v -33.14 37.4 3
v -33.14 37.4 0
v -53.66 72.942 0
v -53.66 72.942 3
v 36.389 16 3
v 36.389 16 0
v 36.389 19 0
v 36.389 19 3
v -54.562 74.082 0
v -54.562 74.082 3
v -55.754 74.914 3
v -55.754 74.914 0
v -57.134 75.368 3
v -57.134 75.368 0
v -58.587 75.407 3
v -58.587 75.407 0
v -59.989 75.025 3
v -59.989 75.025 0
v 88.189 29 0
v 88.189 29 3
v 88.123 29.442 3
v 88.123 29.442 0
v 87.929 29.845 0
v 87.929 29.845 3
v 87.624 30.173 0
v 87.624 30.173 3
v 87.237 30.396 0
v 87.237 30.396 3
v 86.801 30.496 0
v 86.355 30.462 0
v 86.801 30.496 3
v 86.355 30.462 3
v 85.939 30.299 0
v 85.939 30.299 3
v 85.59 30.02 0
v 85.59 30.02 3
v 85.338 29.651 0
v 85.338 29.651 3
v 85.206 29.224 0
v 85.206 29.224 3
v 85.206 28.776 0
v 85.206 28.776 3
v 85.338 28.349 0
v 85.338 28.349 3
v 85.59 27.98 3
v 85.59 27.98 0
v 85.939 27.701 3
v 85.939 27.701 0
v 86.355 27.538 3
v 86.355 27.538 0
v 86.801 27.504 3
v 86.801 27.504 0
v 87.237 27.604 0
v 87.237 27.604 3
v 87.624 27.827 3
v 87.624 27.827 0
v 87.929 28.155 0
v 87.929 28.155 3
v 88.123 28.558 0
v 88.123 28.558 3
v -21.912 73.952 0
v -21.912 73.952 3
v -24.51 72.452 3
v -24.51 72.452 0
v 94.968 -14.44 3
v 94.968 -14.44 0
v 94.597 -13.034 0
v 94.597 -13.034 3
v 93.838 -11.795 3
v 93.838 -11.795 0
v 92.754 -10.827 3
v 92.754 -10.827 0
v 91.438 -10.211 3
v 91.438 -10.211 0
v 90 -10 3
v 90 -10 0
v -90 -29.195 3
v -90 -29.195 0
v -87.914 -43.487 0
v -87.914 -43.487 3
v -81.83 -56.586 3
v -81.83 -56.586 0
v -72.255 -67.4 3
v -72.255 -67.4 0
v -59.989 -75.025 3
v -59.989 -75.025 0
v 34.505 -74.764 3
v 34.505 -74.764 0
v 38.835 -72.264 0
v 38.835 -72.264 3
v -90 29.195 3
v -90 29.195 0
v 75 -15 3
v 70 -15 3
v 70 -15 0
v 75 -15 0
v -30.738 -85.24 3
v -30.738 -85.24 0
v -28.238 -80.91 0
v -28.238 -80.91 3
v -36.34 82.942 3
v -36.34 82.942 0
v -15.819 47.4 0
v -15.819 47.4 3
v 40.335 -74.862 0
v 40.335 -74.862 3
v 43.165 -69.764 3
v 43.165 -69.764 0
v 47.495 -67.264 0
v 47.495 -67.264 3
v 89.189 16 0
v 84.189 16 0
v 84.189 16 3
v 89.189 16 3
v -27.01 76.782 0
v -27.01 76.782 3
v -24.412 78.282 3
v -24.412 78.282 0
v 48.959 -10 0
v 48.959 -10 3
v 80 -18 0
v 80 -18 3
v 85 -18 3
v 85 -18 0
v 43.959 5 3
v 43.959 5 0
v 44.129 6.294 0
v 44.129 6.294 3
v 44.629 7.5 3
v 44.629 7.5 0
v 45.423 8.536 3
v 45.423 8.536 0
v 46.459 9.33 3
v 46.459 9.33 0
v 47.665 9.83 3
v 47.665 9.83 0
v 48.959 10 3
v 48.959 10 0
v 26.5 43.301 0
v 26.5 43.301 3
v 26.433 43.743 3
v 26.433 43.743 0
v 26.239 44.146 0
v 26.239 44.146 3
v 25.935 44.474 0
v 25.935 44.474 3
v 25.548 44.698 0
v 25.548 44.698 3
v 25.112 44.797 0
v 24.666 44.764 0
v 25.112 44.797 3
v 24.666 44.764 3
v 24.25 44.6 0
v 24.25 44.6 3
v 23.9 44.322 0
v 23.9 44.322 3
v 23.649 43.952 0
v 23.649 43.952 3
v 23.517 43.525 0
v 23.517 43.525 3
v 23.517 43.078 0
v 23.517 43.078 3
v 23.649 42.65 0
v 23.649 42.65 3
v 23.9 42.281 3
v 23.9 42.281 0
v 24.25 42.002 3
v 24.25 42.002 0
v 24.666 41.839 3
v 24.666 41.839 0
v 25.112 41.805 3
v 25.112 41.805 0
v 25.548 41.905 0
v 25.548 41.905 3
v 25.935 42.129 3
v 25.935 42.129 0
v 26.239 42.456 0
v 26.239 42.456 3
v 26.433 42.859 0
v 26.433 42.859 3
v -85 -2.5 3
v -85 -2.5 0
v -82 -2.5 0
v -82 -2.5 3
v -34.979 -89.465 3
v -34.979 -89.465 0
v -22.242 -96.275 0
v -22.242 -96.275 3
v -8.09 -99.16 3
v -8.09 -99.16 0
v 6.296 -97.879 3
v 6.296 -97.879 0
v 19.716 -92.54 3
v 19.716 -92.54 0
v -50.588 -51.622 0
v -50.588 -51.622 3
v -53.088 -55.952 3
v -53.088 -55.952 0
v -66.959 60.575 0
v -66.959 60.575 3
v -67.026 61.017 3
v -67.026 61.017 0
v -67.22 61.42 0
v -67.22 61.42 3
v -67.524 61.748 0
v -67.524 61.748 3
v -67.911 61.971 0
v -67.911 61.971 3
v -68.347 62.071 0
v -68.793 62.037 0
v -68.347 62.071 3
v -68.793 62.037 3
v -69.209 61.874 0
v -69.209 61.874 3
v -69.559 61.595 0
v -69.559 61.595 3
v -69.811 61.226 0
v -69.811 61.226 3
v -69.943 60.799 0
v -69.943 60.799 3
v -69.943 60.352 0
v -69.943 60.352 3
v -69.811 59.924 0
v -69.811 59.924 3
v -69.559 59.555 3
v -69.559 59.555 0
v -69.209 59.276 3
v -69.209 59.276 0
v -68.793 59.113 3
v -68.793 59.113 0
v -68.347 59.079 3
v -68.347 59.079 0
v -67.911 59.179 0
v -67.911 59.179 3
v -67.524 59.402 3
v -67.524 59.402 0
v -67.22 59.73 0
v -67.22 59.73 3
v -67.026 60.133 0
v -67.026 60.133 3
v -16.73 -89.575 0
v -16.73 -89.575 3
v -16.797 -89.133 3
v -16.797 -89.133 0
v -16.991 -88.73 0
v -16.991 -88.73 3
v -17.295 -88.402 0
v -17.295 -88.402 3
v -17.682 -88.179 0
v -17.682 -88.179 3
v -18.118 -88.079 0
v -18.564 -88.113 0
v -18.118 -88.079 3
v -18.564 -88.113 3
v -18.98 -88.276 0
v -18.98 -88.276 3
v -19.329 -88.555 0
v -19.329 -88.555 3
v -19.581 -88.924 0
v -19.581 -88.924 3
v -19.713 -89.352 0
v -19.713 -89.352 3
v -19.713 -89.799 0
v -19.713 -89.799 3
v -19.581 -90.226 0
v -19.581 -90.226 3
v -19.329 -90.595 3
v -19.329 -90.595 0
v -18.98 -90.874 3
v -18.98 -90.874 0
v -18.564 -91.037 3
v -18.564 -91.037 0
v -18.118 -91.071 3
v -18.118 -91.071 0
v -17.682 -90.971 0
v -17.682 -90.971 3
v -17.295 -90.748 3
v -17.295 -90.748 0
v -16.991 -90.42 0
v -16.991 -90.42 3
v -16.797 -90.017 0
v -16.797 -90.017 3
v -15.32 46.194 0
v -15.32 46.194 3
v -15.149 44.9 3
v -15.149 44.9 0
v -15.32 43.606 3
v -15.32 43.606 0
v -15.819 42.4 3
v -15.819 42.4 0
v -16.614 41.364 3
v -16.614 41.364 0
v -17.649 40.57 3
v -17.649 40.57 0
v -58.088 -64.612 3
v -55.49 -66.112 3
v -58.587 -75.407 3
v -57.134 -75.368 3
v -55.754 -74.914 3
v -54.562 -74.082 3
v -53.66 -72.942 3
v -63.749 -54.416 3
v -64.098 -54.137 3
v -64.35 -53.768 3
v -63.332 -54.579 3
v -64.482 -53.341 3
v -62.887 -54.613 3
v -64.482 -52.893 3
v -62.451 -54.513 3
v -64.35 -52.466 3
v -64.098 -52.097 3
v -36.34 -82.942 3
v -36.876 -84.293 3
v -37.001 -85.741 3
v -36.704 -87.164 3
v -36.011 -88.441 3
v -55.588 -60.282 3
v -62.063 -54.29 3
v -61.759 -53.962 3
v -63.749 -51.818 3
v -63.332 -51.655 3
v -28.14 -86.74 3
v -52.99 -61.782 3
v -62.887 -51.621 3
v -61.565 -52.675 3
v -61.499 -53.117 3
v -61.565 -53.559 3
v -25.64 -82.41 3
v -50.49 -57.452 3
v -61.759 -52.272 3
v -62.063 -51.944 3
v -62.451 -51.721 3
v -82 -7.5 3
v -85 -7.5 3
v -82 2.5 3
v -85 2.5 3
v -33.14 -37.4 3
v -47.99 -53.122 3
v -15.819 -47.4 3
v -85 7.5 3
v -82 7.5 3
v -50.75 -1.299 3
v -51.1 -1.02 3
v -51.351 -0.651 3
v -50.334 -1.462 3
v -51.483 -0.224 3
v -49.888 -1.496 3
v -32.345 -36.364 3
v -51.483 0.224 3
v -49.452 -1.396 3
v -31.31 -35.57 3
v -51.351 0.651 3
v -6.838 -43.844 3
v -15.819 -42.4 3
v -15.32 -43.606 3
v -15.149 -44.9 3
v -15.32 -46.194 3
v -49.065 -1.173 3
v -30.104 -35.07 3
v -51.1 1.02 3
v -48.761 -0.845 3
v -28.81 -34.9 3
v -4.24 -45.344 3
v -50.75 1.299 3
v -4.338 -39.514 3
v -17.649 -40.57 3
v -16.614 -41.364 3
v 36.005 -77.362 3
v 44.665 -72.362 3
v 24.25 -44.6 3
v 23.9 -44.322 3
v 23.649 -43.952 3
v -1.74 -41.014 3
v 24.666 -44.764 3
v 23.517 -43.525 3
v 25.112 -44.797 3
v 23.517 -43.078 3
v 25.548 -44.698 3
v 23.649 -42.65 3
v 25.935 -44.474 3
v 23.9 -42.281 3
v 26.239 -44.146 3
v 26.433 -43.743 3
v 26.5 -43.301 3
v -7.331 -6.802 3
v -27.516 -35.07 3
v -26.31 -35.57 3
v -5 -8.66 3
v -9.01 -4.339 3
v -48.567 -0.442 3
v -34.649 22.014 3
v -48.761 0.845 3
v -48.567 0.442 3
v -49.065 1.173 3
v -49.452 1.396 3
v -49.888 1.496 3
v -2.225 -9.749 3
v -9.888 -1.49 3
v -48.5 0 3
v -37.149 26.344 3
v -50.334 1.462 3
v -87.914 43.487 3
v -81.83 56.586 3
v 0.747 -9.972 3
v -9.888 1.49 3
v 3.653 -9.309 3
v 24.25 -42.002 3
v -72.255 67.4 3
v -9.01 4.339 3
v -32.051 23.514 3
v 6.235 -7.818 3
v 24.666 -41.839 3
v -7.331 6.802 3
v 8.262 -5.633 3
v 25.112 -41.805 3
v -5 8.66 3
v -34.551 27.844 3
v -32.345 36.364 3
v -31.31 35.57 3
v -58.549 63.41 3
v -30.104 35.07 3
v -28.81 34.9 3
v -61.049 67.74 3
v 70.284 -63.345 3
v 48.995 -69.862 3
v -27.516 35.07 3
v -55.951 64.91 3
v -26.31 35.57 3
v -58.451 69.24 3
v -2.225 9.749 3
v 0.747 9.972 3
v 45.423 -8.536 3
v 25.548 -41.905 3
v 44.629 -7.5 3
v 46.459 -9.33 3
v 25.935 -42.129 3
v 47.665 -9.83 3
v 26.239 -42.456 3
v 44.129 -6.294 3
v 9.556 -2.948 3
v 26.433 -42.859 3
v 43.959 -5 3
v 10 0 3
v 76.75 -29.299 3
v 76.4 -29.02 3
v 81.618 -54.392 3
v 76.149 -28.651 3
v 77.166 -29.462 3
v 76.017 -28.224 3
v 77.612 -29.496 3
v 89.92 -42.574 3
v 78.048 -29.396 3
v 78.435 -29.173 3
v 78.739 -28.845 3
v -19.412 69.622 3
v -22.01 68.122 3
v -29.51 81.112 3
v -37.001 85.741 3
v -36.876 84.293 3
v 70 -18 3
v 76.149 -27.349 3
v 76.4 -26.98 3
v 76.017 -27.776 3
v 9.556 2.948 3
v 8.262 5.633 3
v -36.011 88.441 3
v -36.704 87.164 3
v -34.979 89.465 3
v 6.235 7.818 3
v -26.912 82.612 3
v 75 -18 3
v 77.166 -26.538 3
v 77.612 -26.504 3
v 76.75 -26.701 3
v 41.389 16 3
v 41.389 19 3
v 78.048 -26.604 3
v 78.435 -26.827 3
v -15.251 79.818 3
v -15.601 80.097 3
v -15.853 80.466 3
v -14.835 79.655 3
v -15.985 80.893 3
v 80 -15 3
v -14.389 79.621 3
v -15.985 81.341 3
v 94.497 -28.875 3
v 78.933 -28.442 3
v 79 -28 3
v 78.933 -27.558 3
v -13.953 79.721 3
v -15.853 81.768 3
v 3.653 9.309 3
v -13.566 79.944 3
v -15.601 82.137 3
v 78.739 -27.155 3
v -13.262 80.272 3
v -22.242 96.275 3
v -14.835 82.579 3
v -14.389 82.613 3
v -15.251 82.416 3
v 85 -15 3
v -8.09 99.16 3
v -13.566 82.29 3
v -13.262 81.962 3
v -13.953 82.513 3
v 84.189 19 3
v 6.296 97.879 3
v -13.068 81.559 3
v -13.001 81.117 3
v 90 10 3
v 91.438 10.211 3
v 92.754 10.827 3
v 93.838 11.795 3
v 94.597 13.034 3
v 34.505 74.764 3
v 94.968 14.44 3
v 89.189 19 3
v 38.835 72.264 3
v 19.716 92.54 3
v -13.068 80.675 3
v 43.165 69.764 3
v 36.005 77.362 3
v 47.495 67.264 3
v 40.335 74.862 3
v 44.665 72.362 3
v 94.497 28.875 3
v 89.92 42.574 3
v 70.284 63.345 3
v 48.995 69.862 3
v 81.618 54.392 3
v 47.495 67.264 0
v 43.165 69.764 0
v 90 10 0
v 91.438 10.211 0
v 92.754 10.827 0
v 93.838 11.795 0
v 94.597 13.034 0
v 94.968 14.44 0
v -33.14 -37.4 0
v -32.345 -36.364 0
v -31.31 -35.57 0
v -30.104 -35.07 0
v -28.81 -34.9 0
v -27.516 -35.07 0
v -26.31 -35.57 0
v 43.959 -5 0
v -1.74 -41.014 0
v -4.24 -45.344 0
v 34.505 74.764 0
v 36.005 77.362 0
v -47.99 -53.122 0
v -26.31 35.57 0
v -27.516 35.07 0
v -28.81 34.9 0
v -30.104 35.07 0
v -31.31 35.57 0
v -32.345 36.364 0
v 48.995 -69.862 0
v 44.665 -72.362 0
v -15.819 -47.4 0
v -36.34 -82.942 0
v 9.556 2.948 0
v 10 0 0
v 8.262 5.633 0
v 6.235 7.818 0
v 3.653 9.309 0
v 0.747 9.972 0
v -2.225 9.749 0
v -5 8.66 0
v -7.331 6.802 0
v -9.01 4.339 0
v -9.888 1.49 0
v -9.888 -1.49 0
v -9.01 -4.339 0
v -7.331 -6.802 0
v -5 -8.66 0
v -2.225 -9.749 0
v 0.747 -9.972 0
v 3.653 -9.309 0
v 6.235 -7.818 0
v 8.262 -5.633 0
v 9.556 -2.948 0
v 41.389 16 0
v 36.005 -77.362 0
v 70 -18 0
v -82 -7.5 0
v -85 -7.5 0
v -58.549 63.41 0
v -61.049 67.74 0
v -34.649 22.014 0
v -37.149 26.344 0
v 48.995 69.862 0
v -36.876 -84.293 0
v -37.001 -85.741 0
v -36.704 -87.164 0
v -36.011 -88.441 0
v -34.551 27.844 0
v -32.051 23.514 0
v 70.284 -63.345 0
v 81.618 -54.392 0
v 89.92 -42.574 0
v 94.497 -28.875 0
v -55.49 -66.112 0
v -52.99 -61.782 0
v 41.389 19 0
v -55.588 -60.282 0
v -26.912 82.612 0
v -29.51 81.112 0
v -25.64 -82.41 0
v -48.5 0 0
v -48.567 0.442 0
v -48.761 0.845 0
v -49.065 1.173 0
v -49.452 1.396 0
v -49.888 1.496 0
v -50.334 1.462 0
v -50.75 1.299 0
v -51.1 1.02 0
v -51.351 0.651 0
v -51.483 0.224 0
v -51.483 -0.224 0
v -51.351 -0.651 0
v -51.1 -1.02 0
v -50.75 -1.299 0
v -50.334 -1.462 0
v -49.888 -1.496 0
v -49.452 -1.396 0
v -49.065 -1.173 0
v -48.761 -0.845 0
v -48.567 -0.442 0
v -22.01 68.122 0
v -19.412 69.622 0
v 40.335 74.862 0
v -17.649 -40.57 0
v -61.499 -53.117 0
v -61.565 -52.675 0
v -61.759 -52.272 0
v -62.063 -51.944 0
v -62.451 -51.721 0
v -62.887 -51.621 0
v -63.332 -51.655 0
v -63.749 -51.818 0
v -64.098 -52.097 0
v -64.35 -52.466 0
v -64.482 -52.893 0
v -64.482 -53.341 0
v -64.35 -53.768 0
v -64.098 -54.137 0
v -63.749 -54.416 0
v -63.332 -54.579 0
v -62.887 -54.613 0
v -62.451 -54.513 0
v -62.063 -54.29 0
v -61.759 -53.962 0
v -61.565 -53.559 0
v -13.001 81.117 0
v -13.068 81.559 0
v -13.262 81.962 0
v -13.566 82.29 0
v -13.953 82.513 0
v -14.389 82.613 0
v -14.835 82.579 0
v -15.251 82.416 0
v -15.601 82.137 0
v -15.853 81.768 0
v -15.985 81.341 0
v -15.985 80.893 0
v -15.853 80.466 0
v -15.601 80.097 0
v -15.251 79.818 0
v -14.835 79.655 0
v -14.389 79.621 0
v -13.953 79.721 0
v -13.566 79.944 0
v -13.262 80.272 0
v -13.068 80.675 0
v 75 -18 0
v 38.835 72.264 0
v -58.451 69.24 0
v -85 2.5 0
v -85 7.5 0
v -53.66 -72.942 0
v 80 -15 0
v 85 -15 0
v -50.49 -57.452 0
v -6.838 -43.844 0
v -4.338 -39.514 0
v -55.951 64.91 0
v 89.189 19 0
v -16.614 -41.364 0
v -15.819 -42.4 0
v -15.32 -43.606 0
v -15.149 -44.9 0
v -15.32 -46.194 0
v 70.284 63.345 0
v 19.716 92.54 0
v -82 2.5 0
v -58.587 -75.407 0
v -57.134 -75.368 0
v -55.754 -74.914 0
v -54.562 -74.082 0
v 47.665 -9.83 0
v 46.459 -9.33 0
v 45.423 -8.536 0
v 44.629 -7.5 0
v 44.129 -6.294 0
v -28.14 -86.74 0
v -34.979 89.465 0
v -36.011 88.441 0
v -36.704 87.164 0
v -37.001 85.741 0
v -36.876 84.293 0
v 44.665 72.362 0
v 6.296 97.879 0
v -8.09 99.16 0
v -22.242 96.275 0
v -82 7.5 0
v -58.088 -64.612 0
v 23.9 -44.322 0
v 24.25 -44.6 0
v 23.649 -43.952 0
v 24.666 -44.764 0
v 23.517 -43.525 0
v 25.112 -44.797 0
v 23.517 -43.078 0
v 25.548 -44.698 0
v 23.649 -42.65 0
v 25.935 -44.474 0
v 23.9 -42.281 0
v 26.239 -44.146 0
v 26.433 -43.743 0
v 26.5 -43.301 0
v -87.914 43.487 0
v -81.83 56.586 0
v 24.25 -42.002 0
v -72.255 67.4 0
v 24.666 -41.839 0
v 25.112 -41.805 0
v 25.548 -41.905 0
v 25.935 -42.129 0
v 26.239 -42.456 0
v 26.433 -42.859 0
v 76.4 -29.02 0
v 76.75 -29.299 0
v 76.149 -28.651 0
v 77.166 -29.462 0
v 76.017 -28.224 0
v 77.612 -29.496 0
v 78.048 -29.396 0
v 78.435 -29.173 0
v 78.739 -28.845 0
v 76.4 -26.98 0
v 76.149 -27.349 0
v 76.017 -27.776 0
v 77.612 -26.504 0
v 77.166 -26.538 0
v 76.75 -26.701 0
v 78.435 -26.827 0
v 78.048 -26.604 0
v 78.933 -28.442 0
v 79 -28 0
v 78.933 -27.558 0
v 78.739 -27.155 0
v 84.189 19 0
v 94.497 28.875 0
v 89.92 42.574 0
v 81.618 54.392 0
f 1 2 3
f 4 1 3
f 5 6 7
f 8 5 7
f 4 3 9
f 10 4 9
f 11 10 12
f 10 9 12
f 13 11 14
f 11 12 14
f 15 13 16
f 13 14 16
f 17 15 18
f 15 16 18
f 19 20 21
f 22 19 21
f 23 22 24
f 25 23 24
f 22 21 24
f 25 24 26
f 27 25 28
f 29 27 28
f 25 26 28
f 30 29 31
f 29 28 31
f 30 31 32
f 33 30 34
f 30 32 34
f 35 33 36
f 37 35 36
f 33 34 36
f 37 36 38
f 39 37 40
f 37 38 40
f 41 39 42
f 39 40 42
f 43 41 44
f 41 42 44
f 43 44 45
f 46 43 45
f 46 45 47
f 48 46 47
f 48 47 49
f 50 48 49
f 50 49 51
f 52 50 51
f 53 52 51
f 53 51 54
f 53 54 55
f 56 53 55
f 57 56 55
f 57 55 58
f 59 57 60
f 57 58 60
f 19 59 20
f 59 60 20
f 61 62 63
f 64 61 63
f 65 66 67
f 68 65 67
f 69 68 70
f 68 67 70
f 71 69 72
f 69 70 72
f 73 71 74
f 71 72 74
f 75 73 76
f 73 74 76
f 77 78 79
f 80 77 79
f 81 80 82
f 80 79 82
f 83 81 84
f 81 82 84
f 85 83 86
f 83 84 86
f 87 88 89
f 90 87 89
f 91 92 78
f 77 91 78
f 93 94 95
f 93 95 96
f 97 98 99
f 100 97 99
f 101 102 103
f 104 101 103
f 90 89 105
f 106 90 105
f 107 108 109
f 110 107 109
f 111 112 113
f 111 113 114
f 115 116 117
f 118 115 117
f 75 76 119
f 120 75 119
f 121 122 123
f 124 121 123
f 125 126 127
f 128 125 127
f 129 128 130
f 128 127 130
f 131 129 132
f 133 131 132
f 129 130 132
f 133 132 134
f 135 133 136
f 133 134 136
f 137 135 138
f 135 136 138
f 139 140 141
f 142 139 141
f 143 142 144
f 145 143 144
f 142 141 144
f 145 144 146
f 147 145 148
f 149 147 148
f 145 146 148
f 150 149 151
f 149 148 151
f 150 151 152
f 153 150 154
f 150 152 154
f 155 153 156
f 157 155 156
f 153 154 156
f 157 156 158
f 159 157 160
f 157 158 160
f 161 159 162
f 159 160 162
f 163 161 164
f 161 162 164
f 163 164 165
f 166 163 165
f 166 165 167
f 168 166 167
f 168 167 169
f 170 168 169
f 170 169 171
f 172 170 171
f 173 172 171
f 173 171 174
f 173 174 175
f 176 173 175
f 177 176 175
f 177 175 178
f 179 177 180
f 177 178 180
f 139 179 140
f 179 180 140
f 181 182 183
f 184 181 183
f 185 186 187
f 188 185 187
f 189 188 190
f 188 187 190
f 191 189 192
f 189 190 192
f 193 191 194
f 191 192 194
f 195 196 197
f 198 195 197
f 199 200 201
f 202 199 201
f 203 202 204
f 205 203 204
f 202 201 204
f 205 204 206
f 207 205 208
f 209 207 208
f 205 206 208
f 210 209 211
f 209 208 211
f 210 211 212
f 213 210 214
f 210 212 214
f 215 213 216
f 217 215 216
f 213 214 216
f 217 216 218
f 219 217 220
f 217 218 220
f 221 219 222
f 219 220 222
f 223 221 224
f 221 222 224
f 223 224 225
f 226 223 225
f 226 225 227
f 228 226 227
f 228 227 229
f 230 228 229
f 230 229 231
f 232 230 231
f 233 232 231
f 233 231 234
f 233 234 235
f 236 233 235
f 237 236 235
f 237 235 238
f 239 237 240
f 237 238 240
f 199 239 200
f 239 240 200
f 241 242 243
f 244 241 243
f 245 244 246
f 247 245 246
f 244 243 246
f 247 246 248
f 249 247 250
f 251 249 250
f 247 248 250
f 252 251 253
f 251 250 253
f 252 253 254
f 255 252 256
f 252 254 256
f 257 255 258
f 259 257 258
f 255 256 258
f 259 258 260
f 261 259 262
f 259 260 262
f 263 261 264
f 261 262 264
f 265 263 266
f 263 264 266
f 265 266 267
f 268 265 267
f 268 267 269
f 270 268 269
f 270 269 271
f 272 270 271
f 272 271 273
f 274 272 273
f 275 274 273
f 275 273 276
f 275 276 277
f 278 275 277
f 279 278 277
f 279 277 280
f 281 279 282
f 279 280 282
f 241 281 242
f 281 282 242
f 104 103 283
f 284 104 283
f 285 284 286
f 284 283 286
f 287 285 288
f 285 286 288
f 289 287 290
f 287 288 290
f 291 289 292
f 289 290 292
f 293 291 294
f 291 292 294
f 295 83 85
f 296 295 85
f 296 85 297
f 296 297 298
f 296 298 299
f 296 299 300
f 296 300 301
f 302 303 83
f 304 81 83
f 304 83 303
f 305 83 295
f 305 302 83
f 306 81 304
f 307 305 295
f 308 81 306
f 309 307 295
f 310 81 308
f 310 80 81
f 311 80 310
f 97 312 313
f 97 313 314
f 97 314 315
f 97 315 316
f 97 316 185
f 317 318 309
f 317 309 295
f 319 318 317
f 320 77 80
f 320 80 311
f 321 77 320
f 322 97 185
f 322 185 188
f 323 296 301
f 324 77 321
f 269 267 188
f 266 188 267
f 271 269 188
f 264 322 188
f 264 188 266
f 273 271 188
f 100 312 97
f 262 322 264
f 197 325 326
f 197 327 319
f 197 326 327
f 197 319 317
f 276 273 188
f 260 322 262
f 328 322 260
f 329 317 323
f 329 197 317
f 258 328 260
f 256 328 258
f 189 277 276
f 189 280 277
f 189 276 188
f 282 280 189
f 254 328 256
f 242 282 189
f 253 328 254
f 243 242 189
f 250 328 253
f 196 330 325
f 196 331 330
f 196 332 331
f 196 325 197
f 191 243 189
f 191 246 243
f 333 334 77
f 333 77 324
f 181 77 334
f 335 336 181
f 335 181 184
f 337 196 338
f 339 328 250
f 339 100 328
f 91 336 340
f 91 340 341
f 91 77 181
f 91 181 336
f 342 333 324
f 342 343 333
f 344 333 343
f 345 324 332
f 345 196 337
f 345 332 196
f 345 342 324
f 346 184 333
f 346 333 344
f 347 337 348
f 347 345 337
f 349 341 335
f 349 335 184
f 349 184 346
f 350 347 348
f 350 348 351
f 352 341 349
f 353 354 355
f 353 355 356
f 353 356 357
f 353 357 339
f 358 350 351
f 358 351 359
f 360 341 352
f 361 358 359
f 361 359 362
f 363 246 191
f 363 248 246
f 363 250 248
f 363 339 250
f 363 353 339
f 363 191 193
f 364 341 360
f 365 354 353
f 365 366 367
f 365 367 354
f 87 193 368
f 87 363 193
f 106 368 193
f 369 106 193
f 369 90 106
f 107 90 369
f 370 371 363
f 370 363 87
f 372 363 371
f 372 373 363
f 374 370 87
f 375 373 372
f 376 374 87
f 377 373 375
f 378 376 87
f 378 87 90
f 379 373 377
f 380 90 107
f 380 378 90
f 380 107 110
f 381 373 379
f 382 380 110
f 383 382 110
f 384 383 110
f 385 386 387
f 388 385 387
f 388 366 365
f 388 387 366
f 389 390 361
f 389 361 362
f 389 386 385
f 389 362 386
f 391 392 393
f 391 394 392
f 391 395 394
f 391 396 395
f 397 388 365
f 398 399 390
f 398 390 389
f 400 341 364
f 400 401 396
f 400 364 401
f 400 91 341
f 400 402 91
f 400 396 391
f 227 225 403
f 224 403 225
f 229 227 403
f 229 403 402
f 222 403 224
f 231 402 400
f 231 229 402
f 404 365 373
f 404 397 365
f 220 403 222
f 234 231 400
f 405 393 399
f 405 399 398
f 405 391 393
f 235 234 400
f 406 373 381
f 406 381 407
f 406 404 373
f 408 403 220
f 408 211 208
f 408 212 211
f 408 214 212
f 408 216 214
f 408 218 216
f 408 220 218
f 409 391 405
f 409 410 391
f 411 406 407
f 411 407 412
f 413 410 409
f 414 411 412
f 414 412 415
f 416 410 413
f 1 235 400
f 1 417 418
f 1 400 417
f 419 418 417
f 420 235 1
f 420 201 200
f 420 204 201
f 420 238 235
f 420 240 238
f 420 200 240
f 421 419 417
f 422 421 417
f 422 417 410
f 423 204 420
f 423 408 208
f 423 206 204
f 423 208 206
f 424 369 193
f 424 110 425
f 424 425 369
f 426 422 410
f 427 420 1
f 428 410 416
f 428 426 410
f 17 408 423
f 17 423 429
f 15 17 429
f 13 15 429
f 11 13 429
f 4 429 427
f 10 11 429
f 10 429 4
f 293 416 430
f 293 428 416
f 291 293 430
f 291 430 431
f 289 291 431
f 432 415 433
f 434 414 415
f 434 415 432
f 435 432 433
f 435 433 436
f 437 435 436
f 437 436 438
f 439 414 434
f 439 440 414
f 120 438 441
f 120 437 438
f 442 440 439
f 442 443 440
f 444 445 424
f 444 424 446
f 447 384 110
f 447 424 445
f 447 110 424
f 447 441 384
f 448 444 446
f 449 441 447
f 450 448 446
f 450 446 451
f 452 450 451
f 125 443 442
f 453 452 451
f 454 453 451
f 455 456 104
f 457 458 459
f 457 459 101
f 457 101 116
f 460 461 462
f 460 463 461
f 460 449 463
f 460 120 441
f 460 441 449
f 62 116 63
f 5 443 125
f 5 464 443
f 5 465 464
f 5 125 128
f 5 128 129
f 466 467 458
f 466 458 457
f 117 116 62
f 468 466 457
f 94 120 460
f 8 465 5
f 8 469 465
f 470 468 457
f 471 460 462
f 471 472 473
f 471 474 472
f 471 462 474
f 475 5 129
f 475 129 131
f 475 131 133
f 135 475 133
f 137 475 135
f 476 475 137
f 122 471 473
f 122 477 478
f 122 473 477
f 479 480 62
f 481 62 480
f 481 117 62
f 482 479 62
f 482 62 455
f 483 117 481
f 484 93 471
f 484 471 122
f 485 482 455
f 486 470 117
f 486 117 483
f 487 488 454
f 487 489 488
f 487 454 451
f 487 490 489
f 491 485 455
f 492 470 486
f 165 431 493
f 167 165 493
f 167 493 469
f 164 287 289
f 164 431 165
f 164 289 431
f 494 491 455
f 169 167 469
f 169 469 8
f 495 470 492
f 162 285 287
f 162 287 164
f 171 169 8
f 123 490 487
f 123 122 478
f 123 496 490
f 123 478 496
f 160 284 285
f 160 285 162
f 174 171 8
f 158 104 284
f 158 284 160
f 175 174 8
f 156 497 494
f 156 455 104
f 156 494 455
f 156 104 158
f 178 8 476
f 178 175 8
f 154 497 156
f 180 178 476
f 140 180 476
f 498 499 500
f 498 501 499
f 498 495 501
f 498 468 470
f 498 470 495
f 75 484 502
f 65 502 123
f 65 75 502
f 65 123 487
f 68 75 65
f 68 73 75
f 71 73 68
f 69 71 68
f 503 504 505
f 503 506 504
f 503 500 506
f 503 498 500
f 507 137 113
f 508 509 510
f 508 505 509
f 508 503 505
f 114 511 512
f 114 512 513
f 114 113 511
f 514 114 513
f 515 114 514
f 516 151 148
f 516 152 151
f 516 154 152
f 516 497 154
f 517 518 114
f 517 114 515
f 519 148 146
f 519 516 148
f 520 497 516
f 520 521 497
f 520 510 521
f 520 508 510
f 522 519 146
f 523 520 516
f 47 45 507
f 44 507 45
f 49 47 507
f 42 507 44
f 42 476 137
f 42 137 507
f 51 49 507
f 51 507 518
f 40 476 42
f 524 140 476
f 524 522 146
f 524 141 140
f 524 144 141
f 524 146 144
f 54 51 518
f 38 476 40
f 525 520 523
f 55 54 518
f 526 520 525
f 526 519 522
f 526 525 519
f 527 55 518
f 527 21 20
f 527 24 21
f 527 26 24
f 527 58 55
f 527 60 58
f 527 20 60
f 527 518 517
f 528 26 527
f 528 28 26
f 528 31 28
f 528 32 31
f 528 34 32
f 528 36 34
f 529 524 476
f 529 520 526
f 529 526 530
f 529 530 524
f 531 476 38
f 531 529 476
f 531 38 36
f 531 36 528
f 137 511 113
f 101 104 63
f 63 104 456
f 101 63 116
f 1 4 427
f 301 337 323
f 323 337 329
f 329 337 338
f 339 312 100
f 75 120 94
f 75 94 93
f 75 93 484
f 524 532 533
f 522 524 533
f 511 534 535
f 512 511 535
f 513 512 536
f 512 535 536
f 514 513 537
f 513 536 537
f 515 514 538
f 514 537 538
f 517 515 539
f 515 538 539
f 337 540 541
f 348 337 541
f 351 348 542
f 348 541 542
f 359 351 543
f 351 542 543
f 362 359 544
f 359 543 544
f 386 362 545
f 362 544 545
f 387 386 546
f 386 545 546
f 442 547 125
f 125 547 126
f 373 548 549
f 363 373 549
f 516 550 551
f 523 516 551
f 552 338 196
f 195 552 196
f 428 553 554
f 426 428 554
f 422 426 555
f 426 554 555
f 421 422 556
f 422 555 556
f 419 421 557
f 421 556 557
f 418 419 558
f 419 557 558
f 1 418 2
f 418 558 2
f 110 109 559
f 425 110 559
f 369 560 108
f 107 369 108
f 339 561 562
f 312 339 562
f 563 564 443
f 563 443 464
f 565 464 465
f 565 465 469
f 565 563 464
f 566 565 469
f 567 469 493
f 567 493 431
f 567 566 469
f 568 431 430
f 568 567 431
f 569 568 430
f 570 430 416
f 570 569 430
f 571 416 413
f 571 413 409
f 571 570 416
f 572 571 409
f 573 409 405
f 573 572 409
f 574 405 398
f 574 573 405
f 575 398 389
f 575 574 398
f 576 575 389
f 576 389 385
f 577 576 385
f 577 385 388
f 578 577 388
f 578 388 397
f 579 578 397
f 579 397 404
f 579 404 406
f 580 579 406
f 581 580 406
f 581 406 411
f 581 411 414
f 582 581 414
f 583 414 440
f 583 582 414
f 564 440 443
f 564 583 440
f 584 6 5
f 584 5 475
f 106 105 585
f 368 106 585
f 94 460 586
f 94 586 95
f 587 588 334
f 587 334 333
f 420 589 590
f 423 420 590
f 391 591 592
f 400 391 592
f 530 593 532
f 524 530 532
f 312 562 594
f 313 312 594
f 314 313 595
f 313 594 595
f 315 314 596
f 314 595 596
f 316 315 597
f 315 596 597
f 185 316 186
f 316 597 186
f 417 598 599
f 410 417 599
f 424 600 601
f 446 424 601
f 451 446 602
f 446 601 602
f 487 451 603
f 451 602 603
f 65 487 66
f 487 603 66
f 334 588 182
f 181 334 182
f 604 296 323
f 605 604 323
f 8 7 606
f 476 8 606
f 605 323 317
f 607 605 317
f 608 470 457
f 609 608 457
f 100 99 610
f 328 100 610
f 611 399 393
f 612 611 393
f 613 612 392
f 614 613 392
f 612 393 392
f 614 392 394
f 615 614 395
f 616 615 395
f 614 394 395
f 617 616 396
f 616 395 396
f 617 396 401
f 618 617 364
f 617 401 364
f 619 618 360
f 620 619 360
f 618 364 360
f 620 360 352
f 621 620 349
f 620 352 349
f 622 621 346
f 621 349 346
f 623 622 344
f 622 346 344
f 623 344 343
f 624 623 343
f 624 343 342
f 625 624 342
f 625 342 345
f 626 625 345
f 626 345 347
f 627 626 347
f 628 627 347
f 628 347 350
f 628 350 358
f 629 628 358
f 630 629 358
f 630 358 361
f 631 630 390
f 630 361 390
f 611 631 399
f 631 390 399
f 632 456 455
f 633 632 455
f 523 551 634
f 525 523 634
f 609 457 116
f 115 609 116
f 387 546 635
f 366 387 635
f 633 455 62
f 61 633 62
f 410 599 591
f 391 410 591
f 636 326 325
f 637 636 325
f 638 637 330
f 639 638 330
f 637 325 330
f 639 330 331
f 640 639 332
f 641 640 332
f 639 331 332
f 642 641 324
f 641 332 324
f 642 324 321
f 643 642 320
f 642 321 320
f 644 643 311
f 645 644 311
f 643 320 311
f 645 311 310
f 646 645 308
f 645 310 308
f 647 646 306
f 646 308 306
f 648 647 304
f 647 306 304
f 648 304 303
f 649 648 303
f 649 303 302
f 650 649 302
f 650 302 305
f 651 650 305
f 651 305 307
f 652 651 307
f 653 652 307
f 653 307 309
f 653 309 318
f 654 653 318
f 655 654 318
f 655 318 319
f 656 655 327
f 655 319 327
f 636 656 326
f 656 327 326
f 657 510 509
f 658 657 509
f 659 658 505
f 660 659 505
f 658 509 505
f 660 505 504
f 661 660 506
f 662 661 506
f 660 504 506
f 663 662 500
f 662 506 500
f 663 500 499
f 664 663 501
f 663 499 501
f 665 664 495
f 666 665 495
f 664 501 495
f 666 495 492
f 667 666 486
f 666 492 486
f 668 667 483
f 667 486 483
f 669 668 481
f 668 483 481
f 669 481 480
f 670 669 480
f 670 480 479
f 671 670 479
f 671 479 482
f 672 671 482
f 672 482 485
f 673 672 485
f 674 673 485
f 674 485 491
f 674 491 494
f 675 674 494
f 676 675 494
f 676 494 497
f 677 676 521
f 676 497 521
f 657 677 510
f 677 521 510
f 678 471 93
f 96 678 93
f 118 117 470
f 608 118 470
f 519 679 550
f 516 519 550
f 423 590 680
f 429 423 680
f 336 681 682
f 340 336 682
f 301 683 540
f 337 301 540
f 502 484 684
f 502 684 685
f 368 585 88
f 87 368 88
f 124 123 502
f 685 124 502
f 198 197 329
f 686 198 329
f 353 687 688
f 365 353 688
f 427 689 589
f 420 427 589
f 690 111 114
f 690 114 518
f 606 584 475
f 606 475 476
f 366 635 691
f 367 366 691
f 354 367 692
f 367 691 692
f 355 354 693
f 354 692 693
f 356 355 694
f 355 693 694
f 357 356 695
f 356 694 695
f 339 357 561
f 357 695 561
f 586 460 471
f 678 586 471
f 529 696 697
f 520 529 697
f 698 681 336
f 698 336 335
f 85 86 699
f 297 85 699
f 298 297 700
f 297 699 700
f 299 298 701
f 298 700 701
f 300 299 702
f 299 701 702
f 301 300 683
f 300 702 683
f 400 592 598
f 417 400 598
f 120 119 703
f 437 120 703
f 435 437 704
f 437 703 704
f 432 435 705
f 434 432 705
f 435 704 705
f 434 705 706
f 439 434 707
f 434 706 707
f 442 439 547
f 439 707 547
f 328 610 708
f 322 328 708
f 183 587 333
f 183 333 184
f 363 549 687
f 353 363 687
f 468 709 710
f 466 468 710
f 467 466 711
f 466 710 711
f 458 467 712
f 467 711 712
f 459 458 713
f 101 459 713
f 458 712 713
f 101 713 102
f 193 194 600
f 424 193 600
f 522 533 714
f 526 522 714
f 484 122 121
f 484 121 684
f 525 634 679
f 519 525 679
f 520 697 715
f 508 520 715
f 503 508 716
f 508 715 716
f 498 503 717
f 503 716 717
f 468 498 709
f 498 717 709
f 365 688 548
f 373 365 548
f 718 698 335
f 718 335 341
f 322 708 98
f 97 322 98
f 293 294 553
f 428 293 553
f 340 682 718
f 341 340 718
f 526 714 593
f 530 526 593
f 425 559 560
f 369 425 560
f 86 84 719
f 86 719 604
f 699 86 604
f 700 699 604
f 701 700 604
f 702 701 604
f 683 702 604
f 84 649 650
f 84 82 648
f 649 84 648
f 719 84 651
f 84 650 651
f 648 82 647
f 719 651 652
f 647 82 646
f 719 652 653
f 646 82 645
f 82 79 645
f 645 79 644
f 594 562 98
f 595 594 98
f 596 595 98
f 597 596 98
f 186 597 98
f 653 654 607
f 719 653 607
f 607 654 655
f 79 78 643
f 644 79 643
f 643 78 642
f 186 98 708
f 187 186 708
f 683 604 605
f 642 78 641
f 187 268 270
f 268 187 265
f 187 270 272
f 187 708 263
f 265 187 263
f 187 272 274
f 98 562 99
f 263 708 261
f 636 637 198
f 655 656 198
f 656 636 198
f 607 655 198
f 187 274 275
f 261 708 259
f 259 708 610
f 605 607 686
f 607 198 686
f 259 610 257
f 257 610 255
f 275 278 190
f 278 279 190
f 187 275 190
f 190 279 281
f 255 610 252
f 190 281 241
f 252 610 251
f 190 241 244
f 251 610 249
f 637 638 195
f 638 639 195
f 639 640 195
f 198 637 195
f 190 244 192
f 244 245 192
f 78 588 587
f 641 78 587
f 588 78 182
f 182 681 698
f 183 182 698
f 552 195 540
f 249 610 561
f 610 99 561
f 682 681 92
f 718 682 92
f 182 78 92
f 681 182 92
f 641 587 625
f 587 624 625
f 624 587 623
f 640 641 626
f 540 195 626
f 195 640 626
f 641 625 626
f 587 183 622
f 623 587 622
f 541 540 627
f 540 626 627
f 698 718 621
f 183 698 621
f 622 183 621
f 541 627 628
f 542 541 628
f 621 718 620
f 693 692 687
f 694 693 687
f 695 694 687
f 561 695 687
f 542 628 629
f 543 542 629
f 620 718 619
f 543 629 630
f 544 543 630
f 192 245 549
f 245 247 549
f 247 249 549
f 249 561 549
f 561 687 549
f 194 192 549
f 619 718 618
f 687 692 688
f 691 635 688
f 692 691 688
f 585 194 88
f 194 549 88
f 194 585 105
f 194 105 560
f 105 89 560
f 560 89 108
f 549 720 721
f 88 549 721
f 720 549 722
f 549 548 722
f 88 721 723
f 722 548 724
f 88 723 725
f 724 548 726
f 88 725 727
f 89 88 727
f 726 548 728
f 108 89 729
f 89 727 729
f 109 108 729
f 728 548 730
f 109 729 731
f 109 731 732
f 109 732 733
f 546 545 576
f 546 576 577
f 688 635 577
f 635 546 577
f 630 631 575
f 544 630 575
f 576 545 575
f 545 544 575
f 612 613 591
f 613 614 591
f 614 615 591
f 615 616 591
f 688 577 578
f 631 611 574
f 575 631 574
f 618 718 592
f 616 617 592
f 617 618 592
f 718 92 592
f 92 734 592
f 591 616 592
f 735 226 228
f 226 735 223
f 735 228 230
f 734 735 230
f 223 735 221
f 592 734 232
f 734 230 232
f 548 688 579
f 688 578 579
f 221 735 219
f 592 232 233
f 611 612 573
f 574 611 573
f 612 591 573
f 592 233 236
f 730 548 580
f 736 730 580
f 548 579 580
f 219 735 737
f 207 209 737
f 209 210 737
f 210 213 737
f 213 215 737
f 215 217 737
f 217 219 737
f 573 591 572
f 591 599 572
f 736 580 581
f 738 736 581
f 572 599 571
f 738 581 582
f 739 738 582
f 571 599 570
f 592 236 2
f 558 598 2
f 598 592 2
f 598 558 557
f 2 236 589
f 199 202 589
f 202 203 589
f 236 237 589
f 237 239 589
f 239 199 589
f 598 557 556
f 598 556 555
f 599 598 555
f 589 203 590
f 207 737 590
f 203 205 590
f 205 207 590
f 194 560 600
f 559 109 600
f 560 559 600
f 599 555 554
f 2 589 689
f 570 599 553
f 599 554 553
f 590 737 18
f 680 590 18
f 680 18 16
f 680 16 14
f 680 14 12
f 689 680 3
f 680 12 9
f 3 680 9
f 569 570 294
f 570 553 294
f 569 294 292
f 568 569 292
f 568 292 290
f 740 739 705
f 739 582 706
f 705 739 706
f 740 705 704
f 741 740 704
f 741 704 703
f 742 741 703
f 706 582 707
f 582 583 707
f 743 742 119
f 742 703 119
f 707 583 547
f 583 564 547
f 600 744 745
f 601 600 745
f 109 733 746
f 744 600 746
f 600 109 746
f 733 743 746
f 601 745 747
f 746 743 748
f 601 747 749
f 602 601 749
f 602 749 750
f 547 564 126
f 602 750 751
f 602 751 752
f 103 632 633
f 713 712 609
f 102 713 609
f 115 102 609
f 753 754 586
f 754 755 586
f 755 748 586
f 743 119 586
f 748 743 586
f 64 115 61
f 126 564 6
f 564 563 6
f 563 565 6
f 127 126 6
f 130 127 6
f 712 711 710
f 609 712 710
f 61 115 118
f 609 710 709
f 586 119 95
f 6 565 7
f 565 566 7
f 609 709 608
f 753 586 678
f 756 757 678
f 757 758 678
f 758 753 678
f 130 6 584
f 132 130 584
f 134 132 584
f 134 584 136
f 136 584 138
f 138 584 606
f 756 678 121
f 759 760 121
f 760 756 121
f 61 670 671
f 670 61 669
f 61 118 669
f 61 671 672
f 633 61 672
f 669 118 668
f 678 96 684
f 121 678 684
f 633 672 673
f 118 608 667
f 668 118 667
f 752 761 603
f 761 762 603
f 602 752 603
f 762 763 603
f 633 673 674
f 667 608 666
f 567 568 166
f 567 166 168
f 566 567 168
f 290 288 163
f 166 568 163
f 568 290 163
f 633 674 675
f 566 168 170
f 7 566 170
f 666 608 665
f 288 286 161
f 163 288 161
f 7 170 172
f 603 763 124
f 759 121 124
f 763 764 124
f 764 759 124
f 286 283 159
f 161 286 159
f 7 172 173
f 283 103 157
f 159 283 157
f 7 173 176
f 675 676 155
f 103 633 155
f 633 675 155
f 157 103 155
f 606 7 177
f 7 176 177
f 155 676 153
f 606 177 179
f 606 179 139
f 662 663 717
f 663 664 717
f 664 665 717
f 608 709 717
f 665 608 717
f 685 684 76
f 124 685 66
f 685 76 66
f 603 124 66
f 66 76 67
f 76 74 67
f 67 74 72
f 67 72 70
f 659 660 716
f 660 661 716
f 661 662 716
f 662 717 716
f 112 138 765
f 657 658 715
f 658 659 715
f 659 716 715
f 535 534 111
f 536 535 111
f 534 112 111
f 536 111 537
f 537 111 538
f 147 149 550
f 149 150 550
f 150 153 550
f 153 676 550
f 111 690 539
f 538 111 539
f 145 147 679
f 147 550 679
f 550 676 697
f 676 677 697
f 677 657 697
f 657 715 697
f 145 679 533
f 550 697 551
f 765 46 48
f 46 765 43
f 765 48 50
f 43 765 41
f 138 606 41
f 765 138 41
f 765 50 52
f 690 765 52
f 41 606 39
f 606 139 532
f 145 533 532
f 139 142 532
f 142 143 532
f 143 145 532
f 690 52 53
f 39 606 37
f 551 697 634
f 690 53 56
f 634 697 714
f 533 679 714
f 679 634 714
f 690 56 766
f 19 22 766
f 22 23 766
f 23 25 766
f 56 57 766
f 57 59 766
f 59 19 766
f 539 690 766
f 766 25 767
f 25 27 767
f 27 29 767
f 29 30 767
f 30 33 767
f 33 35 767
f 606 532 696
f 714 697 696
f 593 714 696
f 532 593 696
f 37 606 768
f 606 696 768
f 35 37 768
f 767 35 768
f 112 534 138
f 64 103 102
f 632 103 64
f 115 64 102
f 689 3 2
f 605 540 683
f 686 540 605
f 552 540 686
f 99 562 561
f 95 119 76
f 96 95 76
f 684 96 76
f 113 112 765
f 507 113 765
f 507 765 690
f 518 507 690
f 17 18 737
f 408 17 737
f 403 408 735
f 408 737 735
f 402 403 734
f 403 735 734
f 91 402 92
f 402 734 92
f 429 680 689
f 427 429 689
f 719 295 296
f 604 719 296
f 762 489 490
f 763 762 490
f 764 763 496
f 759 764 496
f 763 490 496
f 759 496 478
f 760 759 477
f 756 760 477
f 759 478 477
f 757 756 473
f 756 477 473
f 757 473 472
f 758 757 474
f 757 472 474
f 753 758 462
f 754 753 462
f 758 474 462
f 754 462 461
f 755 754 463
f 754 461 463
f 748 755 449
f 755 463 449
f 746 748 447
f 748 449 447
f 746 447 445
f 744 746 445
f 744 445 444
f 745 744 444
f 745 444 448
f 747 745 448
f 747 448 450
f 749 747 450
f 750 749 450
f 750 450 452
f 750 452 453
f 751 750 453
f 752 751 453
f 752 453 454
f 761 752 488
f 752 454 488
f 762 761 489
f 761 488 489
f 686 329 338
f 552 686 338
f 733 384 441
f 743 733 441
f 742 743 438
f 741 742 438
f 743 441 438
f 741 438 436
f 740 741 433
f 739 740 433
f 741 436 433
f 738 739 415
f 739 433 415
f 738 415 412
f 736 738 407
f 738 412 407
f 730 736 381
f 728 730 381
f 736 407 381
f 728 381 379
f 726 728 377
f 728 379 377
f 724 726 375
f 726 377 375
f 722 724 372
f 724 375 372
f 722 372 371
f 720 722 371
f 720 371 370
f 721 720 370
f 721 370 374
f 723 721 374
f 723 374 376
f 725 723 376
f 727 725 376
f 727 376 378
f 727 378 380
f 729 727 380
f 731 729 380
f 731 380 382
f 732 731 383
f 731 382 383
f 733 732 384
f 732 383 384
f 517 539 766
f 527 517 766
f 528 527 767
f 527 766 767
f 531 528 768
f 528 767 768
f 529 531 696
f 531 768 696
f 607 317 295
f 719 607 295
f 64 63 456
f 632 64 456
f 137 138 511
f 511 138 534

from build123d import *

# Parameters (mm, degrees)
F0_W     = 3
F0_H     = 5
F0_R     = 10
F0_W_2   = 5
F0_H_2   = 3
F1_DEPTH = 3
F2_R     = 1.5
F2_W     = 5
F2_H     = 3
F3_DEPTH = 3


with BuildPart() as f1:
    # F0 (on Top) → F1 (new body)
    with BuildSketch(Plane.XY):
        with BuildLine():
            Line((48.9590259639, 10), (90, 10))
            ThreePointArc((90, 10), (93.331517757, 11.2715969323), (94.96849641, 14.439604226))
            ThreePointArc((94.96849641, 14.439604226), (89.9197428946, 42.5737351708), (70.2835323098, 63.3448321555))
            Line((70.2835323098, 63.3448321555), (45, 77.9422863406))
            Line((45, 77.9422863406), (19.7164676902, 92.5397405257))
            ThreePointArc((19.7164676902, 92.5397405257), (-8.0899352554, 99.1596492339), (-34.9791841247, 89.4649325633))
            ThreePointArc((-34.9791841247, 89.4649325633), (-36.9042695939, 86.4632638174), (-36.3397459622, 82.9422863406))
            Line((-36.3397459622, 82.9422863406), (-15.8192589441, 47.3997602293))
            ThreePointArc((-15.8192589441, 47.3997602293), (-15.3197568316, 43.6056650038), (-17.649385963, 40.5696332104))
            Line((-17.649385963, 40.5696332104), (-26.3096400009, 35.5696332104))
            ThreePointArc((-26.3096400009, 35.5696332104), (-30.1037352264, 35.0701310979), (-33.1397670198, 37.3997602293))
            Line((-33.1397670198, 37.3997602293), (-53.6602540378, 72.9422863406))
            ThreePointArc((-53.6602540378, 72.9422863406), (-56.4272481631, 75.1916668851), (-59.9893122853, 75.0253283373))
            ThreePointArc((-59.9893122853, 75.0253283373), (-81.8298076392, 56.5859140631), (-90, 29.1949083702))
            Line((-90, 29.1949083702), (-90, 0))
            Line((-90, 0), (-90, -29.1949083702))
            ThreePointArc((-90, -29.1949083702), (-81.8298076392, -56.5859140631), (-59.9893122853, -75.0253283373))
            ThreePointArc((-59.9893122853, -75.0253283373), (-56.4272481631, -75.1916668851), (-53.6602540378, -72.9422863406))
            Line((-53.6602540378, -72.9422863406), (-33.1397670198, -37.3997602293))
            ThreePointArc((-33.1397670198, -37.3997602293), (-30.1037352264, -35.0701310979), (-26.3096400009, -35.5696332104))
            Line((-26.3096400009, -35.5696332104), (-17.649385963, -40.5696332104))
            ThreePointArc((-17.649385963, -40.5696332104), (-15.3197568316, -43.6056650038), (-15.8192589441, -47.3997602293))
            Line((-15.8192589441, -47.3997602293), (-36.3397459622, -82.9422863406))
            ThreePointArc((-36.3397459622, -82.9422863406), (-36.9042695939, -86.4632638174), (-34.9791841247, -89.4649325633))
            ThreePointArc((-34.9791841247, -89.4649325633), (-8.0899352554, -99.1596492339), (19.7164676902, -92.5397405257))
            Line((19.7164676902, -92.5397405257), (45, -77.9422863406))
            Line((45, -77.9422863406), (70.2835323098, -63.3448321555))
            ThreePointArc((70.2835323098, -63.3448321555), (89.9197428946, -42.5737351708), (94.96849641, -14.439604226))
            ThreePointArc((94.96849641, -14.439604226), (93.331517757, -11.2715969323), (90, -10))
            Line((90, -10), (48.9590259639, -10))
            ThreePointArc((48.9590259639, -10), (45.423492058, -8.5355339059), (43.9590259639, -5))
            Line((43.9590259639, -5), (43.9590259639, 5))
            ThreePointArc((43.9590259639, 5), (45.423492058, 8.5355339059), (48.9590259639, 10))
        make_face()
        Polygon((-28.1401412901, -86.7401544467), (-30.7382175015, -85.2401544467), (-28.2382175015, -80.9100274278), (-25.6401412901, -82.4100274278), align=None, mode=Mode.SUBTRACT)
        with Locations((-83.5, -5)):
            Rectangle(F0_W, F0_H, mode=Mode.SUBTRACT)
        Polygon((-4.2401412901, -45.3441401458), (-6.8382175015, -43.8441401458), (-4.3382175015, -39.5140131269), (-1.7401412901, -41.0140131269), align=None, mode=Mode.SUBTRACT)
        Polygon((40.3349364905, -74.8621593217), (36.0048094716, -77.3621593217), (34.5048094716, -74.7640831103), (38.8349364905, -72.2640831103), align=None, mode=Mode.SUBTRACT)
        Polygon((48.9951905284, -69.8621593217), (44.6650635095, -72.3621593217), (43.1650635095, -69.7640831103), (47.4951905284, -67.2640831103), align=None, mode=Mode.SUBTRACT)
        with Locations((-83.5, 5)):
            Rectangle(F0_W, F0_H, mode=Mode.SUBTRACT)
        Circle(F0_R, mode=Mode.SUBTRACT)
        Polygon((-37.1491066339, 26.3441401458), (-34.5510304226, 27.8441401458), (-32.0510304226, 23.5140131269), (-34.6491066339, 22.0140131269), align=None, mode=Mode.SUBTRACT)
        Polygon((-61.0491066339, 67.7401544467), (-58.4510304226, 69.2401544467), (-55.9510304226, 64.9100274278), (-58.5491066339, 63.4100274278), align=None, mode=Mode.SUBTRACT)
        with Locations((38.8892479241, 17.5)):
            Rectangle(F0_W_2, F0_H_2, mode=Mode.SUBTRACT)
        with Locations((86.6892479241, 17.5)):
            Rectangle(F0_W_2, F0_H_2, mode=Mode.SUBTRACT)
        Polygon((44.6650635095, 72.3621593217), (48.9951905284, 69.8621593217), (47.4951905284, 67.2640831103), (43.1650635095, 69.7640831103), align=None, mode=Mode.SUBTRACT)
        Polygon((36.0048094716, 77.3621593217), (40.3349364905, 74.8621593217), (38.8349364905, 72.2640831103), (34.5048094716, 74.7640831103), align=None, mode=Mode.SUBTRACT)
    extrude(amount=F1_DEPTH)

    # F2 (on face) → F3 (cut, through all)
    with BuildSketch(Plane.XY.offset(3)):
        with Locations((-50, 0)):
            Circle(F2_R)
        with Locations((25, -43.3012701892)):
            Circle(F2_R)
        with Locations((25, 43.3012701892)):
            Circle(F2_R)
        with Locations((86.6892479241, 29)):
            Circle(F2_R)
        with Locations((-68.4593606718, 60.5750909372)):
            Circle(F2_R)
        with Locations((-18.2298872523, -89.5750909372)):
            Circle(F2_R)
        with Locations((72.5, -16.5)):
            Rectangle(F2_W, F2_H)
        with Locations((82.5, -16.5)):
            Rectangle(F2_W, F2_H)
        Polygon((-24.5096189432, 72.4519052838), (-22.0096189432, 68.1217782649), (-19.4115427319, 69.6217782649), (-21.9115427319, 73.9519052838), align=None)
        Polygon((-29.5096189432, 81.1121593217), (-27.0096189432, 76.7820323028), (-24.4115427319, 78.2820323028), (-26.9115427319, 82.6121593217), align=None)
        Polygon((-50.4903810568, -57.4519052838), (-47.9903810568, -53.1217782649), (-50.5884572681, -51.6217782649), (-53.0884572681, -55.9519052838), align=None)
        Polygon((-55.4903810568, -66.1121593217), (-52.9903810568, -61.7820323028), (-55.5884572681, -60.2820323028), (-58.0884572681, -64.6121593217), align=None)
        with Locations((77.5, -28)):
            Circle(F2_R)
        with Locations((-14.501288694, 81.1169687933)):
            Circle(F2_R)
        with Locations((-62.998711306, -53.1169687933)):
            Circle(F2_R)
    extrude(amount=-F3_DEPTH, mode=Mode.SUBTRACT)


solid = f1.part
